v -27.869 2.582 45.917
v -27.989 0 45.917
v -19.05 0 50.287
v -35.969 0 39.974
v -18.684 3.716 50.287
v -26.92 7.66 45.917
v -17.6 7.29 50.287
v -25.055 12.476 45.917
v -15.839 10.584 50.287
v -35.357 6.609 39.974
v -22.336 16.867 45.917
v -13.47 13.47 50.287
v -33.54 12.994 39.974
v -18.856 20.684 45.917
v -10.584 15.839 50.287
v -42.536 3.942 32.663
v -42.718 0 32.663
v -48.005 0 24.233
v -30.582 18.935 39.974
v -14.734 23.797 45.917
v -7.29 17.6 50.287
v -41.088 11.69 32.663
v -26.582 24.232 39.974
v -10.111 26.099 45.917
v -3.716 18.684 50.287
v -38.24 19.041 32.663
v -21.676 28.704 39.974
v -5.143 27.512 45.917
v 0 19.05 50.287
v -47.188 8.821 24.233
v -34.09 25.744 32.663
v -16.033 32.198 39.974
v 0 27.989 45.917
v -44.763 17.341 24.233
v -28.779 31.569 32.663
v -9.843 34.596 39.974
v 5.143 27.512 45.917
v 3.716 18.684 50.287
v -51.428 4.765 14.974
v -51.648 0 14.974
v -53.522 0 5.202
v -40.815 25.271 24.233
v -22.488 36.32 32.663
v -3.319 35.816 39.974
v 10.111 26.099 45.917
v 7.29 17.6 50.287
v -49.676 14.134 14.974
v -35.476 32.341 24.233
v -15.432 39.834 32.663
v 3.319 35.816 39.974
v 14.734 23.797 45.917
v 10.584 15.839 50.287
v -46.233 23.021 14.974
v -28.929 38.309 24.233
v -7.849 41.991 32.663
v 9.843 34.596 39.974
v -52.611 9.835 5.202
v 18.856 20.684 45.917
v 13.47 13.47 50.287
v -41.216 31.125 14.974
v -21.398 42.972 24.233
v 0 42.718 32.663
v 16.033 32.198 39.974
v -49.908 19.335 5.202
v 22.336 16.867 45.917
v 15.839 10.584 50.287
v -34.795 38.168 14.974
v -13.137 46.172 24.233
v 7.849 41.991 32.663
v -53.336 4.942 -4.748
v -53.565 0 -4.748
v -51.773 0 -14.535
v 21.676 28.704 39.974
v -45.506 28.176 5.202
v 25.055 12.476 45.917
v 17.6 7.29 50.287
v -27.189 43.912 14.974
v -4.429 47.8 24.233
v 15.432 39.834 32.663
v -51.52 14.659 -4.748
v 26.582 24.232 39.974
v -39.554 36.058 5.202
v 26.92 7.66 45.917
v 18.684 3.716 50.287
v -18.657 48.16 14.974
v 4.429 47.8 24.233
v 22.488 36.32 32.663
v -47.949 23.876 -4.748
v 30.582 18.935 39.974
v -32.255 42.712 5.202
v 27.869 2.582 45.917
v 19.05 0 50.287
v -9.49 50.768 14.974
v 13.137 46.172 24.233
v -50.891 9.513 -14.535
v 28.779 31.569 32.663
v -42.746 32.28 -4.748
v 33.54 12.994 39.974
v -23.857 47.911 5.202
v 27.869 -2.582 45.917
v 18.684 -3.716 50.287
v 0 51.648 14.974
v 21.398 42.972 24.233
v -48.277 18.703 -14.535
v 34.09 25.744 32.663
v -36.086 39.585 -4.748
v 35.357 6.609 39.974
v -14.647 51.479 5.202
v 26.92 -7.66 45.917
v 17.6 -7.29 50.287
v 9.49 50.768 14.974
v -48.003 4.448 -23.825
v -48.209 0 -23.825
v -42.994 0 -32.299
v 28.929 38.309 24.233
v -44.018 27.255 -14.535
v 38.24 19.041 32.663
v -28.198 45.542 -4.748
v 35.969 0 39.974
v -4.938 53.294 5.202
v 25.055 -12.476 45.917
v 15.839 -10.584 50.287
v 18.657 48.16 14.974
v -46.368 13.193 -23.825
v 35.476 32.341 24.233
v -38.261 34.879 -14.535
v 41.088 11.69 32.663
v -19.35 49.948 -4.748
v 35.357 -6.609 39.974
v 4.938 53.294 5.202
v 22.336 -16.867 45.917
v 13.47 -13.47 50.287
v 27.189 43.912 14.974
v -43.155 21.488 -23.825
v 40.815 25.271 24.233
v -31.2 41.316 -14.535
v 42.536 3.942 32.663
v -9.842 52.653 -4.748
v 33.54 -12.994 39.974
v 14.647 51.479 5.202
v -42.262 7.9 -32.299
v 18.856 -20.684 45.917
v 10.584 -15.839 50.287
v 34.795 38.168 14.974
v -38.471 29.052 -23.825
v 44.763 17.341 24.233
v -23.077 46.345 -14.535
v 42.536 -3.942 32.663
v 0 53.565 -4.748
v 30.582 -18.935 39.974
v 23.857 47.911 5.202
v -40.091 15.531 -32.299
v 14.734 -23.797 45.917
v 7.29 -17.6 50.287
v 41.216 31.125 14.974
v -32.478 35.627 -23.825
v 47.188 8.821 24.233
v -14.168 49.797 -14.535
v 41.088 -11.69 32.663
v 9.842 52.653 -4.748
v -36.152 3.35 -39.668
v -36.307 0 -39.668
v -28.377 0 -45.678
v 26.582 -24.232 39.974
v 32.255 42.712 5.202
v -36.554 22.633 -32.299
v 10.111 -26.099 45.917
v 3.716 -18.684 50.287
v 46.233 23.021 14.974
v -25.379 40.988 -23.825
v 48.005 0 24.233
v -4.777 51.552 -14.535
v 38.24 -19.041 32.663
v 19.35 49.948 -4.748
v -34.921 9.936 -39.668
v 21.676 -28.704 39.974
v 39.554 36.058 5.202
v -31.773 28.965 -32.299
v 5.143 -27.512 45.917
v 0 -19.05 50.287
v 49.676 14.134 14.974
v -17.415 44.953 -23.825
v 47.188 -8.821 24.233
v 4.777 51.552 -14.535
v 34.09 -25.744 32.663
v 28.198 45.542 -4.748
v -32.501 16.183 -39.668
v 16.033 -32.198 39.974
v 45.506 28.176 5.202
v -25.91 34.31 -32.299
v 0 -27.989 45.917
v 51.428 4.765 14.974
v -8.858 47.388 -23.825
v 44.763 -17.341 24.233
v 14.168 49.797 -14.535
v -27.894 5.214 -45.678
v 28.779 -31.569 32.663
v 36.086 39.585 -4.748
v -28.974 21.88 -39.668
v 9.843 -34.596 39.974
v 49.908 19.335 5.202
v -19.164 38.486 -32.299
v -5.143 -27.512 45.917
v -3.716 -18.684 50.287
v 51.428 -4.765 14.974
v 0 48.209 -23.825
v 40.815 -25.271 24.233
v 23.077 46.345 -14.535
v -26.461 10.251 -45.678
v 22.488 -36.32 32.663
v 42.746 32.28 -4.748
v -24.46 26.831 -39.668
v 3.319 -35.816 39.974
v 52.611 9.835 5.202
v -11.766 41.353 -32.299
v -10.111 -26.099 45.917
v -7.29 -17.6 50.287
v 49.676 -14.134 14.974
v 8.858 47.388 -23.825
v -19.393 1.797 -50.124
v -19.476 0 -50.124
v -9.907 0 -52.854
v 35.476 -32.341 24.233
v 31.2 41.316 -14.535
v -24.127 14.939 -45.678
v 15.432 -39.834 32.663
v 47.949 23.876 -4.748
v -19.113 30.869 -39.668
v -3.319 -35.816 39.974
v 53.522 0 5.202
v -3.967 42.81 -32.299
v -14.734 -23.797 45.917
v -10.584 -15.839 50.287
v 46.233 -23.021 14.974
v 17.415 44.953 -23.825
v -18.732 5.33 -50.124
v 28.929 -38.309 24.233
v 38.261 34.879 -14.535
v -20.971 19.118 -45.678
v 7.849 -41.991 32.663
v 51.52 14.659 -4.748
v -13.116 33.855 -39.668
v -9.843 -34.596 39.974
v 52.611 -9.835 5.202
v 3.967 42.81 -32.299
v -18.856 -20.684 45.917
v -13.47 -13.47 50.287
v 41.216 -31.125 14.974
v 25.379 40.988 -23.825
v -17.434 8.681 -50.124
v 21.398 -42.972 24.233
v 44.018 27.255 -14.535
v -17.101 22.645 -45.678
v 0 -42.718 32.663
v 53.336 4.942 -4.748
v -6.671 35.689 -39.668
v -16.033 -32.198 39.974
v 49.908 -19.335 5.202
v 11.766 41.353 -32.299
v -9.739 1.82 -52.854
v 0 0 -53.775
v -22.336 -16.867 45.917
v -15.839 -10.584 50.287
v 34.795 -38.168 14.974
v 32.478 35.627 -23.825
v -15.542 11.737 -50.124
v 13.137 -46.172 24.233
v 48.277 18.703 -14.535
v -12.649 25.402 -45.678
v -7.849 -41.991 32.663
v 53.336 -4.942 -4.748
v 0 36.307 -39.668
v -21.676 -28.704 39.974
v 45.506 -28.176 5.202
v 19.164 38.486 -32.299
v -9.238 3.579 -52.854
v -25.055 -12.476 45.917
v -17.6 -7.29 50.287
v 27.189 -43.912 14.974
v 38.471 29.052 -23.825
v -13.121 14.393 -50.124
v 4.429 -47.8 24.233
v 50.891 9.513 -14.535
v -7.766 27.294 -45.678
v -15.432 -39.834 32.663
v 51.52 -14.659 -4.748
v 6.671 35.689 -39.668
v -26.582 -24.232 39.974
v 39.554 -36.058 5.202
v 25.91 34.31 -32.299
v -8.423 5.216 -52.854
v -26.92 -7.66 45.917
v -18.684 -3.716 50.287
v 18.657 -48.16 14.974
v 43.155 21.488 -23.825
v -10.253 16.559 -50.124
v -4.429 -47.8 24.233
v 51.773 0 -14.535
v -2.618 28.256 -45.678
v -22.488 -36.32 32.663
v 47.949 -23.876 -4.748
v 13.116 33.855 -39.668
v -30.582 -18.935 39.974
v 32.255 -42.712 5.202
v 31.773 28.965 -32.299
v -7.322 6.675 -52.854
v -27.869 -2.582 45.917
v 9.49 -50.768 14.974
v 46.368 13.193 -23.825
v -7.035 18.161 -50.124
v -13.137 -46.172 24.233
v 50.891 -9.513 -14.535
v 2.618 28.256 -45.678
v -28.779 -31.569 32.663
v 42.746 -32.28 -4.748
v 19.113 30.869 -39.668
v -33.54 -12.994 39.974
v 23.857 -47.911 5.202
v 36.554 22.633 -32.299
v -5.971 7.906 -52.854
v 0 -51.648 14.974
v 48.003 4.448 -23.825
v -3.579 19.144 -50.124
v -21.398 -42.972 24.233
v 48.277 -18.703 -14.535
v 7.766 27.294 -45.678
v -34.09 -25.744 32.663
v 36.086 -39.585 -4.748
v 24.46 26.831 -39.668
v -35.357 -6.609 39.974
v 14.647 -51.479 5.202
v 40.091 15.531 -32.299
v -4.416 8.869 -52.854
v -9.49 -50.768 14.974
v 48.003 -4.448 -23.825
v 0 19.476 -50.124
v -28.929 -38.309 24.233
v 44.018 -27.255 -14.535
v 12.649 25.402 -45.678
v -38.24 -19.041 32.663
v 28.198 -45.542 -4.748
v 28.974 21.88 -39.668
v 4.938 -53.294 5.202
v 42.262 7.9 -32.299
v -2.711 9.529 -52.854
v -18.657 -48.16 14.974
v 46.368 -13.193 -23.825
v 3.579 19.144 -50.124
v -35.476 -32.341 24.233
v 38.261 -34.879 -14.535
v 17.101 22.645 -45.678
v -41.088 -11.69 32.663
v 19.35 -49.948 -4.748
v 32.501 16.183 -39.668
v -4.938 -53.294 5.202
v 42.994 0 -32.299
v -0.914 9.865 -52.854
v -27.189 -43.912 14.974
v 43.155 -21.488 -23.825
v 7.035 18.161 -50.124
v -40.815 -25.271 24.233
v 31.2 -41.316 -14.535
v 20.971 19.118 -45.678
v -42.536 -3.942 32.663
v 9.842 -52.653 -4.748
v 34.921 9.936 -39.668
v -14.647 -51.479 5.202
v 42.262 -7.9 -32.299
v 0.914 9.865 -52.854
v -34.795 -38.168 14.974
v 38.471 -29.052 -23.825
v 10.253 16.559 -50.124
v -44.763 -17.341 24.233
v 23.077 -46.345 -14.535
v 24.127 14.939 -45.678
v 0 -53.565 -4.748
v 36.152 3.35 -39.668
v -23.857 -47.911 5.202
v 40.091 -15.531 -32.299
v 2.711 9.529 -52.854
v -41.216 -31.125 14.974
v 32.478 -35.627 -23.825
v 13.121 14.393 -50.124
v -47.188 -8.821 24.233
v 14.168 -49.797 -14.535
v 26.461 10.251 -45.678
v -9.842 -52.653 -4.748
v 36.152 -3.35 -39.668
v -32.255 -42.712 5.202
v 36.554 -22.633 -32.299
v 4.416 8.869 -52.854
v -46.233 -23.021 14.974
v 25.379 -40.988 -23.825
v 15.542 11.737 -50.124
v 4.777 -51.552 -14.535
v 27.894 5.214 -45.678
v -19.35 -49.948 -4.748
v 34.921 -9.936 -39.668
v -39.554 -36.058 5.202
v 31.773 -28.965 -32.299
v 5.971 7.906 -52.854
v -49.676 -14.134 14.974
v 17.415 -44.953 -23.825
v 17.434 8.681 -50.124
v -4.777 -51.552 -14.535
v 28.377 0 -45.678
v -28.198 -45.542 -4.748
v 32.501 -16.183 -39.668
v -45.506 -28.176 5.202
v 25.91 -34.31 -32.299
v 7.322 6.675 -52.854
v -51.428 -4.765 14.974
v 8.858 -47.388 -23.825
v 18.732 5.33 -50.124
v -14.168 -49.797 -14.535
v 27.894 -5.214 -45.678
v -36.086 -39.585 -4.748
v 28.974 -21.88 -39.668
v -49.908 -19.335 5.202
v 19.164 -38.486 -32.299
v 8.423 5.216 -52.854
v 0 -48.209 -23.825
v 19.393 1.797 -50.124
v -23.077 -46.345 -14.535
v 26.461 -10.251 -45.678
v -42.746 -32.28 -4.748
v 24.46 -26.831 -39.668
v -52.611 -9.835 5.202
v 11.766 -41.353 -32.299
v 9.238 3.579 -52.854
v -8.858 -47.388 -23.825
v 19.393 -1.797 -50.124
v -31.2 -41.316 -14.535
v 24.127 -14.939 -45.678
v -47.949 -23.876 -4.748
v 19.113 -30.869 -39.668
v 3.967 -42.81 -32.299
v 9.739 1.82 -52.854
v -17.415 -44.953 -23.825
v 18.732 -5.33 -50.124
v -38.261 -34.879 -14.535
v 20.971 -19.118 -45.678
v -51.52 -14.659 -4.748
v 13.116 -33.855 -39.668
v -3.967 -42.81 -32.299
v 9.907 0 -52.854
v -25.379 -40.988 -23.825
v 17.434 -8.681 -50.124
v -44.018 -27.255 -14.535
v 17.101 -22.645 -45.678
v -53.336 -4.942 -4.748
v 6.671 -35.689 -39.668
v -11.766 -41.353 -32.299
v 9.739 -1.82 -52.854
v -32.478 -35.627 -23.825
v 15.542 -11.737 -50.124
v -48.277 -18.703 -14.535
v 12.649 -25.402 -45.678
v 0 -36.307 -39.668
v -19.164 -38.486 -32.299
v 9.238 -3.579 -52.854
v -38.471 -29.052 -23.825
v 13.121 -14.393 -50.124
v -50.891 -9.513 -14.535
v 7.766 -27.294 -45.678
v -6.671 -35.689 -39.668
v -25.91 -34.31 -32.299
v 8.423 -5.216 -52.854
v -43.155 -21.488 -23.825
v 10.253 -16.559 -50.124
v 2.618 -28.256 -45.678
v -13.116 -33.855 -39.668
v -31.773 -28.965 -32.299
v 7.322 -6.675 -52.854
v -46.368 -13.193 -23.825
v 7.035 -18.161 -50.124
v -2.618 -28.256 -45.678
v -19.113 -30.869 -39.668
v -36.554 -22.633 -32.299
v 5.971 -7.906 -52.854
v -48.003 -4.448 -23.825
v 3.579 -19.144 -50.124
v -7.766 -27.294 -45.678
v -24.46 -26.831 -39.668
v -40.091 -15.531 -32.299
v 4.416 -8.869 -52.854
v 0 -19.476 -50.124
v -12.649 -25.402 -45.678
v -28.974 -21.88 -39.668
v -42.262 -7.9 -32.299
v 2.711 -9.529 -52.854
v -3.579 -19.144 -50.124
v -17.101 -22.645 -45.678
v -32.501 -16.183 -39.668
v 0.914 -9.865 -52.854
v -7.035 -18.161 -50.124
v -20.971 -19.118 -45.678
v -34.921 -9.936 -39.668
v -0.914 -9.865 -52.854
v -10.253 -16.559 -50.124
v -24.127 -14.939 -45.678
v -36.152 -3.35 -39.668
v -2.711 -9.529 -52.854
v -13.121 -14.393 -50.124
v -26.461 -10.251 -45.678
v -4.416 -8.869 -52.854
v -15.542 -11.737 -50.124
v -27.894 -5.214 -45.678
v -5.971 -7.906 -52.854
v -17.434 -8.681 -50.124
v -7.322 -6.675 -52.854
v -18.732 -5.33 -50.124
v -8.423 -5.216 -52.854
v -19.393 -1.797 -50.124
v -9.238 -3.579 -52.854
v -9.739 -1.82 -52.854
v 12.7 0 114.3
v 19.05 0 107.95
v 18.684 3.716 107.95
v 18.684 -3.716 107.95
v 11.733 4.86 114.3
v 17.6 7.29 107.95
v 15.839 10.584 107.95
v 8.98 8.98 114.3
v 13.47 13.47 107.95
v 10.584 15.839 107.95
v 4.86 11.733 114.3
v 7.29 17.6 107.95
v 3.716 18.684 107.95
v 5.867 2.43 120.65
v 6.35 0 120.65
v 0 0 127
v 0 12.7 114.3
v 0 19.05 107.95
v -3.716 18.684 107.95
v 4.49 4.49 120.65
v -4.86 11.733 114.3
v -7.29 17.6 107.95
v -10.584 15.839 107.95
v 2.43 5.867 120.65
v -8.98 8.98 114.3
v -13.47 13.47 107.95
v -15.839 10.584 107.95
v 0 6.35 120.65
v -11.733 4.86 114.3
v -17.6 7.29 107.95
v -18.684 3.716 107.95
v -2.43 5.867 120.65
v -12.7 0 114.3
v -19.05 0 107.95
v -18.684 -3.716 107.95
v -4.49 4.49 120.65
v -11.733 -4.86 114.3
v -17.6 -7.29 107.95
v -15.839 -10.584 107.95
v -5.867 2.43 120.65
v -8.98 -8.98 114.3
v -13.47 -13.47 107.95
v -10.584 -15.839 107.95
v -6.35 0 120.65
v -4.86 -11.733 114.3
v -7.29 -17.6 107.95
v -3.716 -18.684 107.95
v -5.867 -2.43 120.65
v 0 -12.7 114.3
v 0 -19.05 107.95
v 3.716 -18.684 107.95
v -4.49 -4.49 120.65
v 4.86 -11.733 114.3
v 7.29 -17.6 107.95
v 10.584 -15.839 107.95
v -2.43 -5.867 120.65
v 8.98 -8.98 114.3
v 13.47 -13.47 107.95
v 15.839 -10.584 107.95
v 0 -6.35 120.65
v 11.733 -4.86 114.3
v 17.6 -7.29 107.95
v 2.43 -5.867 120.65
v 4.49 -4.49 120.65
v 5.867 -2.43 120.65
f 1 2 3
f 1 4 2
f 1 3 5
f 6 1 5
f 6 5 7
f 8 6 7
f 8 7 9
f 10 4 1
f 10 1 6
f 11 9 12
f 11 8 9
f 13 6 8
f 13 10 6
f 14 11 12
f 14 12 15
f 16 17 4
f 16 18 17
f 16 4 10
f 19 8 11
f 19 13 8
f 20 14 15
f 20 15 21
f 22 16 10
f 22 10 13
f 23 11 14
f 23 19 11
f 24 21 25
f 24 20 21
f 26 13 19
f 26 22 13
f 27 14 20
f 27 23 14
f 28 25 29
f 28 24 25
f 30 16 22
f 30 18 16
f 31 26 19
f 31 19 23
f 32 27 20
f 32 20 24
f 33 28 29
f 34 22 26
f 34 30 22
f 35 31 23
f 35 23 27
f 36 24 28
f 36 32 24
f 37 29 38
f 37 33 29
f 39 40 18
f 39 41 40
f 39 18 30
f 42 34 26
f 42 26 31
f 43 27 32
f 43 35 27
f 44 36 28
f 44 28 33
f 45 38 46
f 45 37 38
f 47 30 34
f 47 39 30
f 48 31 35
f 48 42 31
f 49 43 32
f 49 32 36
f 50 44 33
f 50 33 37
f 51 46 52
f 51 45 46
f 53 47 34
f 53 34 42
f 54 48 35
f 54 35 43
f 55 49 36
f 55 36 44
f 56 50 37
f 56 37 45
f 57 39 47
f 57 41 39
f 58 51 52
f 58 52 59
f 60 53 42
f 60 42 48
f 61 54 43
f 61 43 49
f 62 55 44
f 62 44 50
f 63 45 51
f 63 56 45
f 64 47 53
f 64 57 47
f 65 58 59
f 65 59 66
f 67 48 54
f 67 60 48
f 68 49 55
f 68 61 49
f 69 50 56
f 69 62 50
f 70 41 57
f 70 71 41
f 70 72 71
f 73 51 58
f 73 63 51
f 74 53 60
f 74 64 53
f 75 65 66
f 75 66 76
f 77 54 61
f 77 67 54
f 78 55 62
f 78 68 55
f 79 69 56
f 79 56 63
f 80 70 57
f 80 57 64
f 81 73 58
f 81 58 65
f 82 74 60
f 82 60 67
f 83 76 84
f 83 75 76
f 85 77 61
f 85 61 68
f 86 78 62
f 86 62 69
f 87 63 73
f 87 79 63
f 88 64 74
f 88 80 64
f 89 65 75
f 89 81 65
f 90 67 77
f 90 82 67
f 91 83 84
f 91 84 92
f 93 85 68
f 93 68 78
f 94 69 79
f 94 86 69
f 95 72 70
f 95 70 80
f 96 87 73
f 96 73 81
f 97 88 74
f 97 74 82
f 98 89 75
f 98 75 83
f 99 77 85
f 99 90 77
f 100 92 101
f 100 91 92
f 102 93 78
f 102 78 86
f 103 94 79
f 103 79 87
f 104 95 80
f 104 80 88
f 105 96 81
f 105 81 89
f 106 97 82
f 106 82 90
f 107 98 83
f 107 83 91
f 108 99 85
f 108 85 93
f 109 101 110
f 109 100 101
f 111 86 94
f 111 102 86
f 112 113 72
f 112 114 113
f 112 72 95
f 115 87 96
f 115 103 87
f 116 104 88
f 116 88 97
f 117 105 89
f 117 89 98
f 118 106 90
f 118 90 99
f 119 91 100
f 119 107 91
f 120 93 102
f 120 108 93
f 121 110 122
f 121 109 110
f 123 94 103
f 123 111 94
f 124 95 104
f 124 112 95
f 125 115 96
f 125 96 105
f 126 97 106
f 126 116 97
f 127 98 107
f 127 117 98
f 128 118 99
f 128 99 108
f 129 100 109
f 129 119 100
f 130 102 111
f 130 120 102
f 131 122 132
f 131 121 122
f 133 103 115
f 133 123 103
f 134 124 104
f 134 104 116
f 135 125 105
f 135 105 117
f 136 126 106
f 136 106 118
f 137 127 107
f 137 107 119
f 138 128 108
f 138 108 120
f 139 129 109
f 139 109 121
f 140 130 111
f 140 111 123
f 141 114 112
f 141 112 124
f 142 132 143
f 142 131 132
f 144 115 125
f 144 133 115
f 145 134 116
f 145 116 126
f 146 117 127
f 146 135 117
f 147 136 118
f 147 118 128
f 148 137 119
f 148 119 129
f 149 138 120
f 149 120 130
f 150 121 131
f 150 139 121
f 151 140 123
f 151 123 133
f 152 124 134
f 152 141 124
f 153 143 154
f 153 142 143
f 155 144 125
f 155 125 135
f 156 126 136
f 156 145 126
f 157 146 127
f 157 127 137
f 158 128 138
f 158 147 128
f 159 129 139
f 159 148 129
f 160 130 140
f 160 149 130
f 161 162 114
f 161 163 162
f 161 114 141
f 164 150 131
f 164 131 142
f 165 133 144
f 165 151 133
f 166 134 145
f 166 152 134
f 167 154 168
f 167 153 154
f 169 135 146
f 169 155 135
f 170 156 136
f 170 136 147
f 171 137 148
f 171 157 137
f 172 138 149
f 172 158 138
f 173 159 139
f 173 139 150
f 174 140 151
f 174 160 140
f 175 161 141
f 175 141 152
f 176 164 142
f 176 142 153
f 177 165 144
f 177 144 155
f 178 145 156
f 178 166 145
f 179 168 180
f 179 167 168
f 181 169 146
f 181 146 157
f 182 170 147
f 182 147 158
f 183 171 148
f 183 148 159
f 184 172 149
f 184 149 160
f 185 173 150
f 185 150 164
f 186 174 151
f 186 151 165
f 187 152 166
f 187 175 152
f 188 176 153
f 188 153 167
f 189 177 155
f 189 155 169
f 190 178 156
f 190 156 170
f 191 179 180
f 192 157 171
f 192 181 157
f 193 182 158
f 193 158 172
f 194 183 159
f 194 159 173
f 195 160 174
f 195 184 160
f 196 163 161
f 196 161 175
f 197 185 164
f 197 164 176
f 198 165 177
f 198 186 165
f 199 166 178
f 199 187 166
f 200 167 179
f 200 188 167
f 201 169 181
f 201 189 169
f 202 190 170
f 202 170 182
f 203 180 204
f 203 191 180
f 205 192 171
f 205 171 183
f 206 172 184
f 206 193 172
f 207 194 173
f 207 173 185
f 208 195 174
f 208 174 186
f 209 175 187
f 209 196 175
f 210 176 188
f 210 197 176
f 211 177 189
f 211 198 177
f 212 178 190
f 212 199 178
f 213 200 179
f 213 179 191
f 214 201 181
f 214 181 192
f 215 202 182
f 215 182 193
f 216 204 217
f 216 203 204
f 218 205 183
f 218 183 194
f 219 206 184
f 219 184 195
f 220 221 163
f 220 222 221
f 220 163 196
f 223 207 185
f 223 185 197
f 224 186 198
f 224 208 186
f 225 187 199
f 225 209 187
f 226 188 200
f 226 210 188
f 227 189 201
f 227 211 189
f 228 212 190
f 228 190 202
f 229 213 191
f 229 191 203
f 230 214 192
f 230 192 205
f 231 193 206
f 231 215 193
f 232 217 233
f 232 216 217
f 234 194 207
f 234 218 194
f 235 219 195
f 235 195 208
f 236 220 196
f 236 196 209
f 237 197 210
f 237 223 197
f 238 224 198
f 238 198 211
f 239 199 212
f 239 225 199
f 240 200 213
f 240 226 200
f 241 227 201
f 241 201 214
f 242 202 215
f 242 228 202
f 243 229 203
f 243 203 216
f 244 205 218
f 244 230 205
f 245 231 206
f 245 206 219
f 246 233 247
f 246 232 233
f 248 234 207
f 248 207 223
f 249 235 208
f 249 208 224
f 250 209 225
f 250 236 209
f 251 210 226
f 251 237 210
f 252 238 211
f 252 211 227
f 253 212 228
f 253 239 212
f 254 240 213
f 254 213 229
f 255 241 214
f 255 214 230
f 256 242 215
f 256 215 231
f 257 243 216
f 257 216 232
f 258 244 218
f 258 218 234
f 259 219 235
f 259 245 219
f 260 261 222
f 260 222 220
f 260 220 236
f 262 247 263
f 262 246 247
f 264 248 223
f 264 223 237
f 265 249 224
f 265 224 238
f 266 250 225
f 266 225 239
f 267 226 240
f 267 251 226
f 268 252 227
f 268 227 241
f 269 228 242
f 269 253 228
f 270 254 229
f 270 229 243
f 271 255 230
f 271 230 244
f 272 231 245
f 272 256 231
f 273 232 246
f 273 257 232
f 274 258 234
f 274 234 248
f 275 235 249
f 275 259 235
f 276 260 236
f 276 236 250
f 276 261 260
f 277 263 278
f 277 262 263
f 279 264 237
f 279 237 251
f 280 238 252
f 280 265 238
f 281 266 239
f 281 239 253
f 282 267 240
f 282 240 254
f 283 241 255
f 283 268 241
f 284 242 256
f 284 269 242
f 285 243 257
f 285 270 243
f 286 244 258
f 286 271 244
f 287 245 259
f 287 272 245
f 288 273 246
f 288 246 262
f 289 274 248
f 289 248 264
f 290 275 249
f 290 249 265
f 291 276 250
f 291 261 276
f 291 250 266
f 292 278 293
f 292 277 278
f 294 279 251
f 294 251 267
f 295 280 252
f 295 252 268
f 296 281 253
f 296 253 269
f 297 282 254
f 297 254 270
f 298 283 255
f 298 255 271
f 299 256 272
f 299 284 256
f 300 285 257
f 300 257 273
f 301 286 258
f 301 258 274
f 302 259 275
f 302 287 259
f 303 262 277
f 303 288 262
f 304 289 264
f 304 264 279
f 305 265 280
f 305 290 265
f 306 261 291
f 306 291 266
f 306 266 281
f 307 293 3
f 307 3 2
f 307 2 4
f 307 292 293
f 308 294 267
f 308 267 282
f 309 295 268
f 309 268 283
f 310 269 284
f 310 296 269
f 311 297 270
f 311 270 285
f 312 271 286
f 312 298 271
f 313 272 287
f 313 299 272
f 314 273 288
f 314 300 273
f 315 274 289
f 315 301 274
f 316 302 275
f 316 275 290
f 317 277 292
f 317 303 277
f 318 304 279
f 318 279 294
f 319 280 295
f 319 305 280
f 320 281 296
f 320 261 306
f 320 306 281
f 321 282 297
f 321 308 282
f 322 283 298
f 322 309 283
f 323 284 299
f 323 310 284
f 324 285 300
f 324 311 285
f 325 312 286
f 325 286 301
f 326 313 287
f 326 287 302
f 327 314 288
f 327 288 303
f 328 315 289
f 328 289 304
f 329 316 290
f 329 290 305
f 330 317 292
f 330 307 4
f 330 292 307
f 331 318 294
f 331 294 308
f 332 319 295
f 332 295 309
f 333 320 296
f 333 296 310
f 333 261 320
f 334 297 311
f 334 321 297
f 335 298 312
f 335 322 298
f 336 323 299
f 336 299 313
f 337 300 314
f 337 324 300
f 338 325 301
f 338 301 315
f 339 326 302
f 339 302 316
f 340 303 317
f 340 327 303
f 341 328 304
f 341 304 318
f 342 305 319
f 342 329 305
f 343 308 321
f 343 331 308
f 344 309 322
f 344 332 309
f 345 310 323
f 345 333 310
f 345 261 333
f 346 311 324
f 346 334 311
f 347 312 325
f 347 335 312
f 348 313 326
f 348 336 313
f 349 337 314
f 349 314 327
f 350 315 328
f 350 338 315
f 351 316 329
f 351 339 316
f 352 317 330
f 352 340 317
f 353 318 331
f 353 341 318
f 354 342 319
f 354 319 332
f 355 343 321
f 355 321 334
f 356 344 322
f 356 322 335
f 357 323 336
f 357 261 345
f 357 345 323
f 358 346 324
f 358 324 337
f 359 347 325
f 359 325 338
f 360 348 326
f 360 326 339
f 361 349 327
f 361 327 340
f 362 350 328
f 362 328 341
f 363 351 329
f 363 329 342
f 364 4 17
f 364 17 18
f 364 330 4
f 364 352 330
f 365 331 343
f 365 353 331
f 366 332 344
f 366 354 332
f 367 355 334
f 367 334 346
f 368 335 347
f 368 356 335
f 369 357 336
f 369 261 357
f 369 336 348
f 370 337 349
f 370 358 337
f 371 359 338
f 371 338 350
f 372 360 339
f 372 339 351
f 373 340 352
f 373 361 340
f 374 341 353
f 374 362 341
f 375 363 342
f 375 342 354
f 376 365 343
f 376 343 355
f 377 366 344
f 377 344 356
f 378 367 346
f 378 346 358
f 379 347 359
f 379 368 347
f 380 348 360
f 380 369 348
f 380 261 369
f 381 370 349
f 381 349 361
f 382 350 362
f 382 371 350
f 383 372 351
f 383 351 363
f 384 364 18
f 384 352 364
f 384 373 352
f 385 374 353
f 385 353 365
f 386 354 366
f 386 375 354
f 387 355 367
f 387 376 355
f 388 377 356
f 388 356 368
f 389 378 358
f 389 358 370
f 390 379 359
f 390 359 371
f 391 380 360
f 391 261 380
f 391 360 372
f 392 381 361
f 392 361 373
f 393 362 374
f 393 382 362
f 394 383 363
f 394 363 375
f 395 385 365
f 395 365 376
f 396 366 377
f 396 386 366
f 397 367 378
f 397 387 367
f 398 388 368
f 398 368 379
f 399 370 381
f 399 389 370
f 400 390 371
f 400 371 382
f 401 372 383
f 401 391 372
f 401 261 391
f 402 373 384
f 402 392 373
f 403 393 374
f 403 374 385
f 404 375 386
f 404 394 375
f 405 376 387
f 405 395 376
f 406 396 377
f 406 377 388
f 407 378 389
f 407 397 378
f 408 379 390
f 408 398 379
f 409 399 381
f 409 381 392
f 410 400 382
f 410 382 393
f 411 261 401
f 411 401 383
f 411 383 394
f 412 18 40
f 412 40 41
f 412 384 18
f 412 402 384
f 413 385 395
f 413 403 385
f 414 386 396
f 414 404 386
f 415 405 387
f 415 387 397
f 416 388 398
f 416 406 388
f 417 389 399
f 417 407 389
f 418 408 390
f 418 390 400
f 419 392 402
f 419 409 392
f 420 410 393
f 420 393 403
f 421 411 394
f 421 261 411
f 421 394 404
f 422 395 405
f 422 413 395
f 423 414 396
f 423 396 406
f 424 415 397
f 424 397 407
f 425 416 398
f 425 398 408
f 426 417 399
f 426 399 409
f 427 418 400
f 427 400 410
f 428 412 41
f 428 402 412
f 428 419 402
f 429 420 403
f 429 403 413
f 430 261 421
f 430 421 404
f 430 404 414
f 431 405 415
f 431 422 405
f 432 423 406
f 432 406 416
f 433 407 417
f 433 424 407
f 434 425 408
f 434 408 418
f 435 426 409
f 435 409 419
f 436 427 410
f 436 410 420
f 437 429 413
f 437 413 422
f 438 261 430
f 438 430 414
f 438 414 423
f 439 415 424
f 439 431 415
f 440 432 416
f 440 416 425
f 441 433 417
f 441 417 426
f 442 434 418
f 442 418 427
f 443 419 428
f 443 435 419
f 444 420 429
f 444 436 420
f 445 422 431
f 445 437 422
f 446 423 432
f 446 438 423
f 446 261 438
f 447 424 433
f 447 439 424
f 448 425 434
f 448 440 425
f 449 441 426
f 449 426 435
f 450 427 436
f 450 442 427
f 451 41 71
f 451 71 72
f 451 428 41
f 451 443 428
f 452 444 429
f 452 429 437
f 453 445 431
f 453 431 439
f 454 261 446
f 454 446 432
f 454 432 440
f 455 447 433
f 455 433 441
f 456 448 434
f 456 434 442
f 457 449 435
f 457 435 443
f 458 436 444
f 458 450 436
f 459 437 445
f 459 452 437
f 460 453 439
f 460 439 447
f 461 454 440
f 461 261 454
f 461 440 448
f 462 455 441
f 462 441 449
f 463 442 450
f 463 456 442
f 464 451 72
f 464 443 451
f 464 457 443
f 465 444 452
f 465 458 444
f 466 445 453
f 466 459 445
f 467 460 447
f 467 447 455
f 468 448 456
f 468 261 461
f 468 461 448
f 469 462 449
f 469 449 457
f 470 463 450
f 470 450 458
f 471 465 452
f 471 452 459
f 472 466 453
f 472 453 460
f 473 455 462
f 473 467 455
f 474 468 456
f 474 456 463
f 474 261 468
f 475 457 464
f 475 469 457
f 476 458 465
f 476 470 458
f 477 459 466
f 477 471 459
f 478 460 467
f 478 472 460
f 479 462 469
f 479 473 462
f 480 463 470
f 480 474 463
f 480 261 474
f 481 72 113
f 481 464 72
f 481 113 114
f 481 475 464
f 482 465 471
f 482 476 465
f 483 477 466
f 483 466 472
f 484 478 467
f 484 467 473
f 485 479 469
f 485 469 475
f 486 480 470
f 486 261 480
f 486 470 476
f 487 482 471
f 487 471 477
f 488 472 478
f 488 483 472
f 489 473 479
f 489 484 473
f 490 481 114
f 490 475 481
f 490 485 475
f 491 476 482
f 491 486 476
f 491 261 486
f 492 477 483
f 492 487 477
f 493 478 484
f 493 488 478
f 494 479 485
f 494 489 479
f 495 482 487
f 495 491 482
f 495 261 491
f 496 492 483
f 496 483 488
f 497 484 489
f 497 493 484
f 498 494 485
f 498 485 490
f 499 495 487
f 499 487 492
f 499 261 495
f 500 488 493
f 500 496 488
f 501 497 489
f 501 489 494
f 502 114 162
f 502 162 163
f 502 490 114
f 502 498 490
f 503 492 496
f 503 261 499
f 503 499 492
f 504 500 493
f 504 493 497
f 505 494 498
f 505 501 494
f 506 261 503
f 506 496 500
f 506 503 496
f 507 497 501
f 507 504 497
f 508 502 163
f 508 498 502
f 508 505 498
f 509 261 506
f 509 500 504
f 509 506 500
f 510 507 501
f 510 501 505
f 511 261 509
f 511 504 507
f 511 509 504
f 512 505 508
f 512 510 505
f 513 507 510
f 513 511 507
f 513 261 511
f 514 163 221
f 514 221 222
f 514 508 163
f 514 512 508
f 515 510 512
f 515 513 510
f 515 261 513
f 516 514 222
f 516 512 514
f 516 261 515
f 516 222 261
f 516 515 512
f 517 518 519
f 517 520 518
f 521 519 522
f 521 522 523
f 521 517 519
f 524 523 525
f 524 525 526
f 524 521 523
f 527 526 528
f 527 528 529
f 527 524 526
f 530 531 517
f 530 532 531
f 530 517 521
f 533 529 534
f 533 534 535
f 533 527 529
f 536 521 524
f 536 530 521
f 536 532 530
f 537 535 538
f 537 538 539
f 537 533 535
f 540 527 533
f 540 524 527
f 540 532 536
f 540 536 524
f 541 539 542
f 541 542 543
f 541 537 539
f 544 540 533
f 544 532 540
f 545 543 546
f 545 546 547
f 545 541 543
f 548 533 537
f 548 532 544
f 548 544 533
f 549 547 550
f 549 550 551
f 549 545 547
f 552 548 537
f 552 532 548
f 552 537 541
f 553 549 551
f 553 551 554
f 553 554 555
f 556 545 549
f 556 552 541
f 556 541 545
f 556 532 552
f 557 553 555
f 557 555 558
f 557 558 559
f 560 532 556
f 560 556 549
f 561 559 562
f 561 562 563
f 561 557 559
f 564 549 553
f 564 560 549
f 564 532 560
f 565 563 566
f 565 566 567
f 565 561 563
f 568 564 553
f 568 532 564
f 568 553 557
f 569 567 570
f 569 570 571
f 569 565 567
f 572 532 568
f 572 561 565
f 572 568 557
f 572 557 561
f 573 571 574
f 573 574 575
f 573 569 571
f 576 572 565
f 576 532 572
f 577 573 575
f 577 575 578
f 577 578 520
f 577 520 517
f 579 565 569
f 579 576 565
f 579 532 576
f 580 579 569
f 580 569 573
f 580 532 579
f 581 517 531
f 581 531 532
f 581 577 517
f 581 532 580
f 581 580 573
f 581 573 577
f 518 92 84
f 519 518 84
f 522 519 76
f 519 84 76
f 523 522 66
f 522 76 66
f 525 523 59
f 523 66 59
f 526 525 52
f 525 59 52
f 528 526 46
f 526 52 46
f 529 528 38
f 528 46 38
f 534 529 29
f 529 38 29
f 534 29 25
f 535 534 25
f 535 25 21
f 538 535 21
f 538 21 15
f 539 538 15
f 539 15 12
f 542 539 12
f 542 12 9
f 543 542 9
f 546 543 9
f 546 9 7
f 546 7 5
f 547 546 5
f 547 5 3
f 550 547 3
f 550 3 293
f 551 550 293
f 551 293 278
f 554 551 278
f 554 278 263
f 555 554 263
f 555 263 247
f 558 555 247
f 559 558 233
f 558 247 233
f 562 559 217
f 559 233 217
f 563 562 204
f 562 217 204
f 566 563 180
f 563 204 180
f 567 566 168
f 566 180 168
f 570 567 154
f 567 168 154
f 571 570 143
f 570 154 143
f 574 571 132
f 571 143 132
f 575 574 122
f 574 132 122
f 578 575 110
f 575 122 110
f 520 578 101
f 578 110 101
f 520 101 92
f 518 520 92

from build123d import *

# Parameters (mm, degrees)
F2_R     = 19.05
F3_DEPTH = 25.4
F4_DEPTH = 127
F5_SIZE  = 19.05


with BuildPart() as f1:
    # F0 (on Front) → F1 (revolve)
    with BuildSketch(Plane.XZ):
        with BuildLine():
            Line((0, 0), (0, 53.77469))
            ThreePointArc((0, 53.77469), (-53.77469, 0), (0, -53.77469))
            Line((0, -53.77469), (0, 0))
        make_face()
    revolve(axis=Axis((0, 0, 26.887345), (0, 0, -1)))



with BuildPart() as f3:
    # F2 (on Top) → F3 (new body)
    with BuildSketch(Plane.XY):
        Circle(F2_R)
    extrude(amount=-F3_DEPTH)


with BuildPart() as f1_1:
    add(f1.part)

    add(f3.part)  # F4 merges F3
    # F2 (on Top) → F4 (join)
    with BuildSketch(Plane.XY):
        Circle(F2_R)
    extrude(amount=F4_DEPTH)

    # F5
    f5_edges = [f1_1.edges().sort_by_distance(p)[0] for p in [
        (-19.05, 0, 127),
    ]]
    chamfer(f5_edges, length=F5_SIZE)


solid = f1_1.part
